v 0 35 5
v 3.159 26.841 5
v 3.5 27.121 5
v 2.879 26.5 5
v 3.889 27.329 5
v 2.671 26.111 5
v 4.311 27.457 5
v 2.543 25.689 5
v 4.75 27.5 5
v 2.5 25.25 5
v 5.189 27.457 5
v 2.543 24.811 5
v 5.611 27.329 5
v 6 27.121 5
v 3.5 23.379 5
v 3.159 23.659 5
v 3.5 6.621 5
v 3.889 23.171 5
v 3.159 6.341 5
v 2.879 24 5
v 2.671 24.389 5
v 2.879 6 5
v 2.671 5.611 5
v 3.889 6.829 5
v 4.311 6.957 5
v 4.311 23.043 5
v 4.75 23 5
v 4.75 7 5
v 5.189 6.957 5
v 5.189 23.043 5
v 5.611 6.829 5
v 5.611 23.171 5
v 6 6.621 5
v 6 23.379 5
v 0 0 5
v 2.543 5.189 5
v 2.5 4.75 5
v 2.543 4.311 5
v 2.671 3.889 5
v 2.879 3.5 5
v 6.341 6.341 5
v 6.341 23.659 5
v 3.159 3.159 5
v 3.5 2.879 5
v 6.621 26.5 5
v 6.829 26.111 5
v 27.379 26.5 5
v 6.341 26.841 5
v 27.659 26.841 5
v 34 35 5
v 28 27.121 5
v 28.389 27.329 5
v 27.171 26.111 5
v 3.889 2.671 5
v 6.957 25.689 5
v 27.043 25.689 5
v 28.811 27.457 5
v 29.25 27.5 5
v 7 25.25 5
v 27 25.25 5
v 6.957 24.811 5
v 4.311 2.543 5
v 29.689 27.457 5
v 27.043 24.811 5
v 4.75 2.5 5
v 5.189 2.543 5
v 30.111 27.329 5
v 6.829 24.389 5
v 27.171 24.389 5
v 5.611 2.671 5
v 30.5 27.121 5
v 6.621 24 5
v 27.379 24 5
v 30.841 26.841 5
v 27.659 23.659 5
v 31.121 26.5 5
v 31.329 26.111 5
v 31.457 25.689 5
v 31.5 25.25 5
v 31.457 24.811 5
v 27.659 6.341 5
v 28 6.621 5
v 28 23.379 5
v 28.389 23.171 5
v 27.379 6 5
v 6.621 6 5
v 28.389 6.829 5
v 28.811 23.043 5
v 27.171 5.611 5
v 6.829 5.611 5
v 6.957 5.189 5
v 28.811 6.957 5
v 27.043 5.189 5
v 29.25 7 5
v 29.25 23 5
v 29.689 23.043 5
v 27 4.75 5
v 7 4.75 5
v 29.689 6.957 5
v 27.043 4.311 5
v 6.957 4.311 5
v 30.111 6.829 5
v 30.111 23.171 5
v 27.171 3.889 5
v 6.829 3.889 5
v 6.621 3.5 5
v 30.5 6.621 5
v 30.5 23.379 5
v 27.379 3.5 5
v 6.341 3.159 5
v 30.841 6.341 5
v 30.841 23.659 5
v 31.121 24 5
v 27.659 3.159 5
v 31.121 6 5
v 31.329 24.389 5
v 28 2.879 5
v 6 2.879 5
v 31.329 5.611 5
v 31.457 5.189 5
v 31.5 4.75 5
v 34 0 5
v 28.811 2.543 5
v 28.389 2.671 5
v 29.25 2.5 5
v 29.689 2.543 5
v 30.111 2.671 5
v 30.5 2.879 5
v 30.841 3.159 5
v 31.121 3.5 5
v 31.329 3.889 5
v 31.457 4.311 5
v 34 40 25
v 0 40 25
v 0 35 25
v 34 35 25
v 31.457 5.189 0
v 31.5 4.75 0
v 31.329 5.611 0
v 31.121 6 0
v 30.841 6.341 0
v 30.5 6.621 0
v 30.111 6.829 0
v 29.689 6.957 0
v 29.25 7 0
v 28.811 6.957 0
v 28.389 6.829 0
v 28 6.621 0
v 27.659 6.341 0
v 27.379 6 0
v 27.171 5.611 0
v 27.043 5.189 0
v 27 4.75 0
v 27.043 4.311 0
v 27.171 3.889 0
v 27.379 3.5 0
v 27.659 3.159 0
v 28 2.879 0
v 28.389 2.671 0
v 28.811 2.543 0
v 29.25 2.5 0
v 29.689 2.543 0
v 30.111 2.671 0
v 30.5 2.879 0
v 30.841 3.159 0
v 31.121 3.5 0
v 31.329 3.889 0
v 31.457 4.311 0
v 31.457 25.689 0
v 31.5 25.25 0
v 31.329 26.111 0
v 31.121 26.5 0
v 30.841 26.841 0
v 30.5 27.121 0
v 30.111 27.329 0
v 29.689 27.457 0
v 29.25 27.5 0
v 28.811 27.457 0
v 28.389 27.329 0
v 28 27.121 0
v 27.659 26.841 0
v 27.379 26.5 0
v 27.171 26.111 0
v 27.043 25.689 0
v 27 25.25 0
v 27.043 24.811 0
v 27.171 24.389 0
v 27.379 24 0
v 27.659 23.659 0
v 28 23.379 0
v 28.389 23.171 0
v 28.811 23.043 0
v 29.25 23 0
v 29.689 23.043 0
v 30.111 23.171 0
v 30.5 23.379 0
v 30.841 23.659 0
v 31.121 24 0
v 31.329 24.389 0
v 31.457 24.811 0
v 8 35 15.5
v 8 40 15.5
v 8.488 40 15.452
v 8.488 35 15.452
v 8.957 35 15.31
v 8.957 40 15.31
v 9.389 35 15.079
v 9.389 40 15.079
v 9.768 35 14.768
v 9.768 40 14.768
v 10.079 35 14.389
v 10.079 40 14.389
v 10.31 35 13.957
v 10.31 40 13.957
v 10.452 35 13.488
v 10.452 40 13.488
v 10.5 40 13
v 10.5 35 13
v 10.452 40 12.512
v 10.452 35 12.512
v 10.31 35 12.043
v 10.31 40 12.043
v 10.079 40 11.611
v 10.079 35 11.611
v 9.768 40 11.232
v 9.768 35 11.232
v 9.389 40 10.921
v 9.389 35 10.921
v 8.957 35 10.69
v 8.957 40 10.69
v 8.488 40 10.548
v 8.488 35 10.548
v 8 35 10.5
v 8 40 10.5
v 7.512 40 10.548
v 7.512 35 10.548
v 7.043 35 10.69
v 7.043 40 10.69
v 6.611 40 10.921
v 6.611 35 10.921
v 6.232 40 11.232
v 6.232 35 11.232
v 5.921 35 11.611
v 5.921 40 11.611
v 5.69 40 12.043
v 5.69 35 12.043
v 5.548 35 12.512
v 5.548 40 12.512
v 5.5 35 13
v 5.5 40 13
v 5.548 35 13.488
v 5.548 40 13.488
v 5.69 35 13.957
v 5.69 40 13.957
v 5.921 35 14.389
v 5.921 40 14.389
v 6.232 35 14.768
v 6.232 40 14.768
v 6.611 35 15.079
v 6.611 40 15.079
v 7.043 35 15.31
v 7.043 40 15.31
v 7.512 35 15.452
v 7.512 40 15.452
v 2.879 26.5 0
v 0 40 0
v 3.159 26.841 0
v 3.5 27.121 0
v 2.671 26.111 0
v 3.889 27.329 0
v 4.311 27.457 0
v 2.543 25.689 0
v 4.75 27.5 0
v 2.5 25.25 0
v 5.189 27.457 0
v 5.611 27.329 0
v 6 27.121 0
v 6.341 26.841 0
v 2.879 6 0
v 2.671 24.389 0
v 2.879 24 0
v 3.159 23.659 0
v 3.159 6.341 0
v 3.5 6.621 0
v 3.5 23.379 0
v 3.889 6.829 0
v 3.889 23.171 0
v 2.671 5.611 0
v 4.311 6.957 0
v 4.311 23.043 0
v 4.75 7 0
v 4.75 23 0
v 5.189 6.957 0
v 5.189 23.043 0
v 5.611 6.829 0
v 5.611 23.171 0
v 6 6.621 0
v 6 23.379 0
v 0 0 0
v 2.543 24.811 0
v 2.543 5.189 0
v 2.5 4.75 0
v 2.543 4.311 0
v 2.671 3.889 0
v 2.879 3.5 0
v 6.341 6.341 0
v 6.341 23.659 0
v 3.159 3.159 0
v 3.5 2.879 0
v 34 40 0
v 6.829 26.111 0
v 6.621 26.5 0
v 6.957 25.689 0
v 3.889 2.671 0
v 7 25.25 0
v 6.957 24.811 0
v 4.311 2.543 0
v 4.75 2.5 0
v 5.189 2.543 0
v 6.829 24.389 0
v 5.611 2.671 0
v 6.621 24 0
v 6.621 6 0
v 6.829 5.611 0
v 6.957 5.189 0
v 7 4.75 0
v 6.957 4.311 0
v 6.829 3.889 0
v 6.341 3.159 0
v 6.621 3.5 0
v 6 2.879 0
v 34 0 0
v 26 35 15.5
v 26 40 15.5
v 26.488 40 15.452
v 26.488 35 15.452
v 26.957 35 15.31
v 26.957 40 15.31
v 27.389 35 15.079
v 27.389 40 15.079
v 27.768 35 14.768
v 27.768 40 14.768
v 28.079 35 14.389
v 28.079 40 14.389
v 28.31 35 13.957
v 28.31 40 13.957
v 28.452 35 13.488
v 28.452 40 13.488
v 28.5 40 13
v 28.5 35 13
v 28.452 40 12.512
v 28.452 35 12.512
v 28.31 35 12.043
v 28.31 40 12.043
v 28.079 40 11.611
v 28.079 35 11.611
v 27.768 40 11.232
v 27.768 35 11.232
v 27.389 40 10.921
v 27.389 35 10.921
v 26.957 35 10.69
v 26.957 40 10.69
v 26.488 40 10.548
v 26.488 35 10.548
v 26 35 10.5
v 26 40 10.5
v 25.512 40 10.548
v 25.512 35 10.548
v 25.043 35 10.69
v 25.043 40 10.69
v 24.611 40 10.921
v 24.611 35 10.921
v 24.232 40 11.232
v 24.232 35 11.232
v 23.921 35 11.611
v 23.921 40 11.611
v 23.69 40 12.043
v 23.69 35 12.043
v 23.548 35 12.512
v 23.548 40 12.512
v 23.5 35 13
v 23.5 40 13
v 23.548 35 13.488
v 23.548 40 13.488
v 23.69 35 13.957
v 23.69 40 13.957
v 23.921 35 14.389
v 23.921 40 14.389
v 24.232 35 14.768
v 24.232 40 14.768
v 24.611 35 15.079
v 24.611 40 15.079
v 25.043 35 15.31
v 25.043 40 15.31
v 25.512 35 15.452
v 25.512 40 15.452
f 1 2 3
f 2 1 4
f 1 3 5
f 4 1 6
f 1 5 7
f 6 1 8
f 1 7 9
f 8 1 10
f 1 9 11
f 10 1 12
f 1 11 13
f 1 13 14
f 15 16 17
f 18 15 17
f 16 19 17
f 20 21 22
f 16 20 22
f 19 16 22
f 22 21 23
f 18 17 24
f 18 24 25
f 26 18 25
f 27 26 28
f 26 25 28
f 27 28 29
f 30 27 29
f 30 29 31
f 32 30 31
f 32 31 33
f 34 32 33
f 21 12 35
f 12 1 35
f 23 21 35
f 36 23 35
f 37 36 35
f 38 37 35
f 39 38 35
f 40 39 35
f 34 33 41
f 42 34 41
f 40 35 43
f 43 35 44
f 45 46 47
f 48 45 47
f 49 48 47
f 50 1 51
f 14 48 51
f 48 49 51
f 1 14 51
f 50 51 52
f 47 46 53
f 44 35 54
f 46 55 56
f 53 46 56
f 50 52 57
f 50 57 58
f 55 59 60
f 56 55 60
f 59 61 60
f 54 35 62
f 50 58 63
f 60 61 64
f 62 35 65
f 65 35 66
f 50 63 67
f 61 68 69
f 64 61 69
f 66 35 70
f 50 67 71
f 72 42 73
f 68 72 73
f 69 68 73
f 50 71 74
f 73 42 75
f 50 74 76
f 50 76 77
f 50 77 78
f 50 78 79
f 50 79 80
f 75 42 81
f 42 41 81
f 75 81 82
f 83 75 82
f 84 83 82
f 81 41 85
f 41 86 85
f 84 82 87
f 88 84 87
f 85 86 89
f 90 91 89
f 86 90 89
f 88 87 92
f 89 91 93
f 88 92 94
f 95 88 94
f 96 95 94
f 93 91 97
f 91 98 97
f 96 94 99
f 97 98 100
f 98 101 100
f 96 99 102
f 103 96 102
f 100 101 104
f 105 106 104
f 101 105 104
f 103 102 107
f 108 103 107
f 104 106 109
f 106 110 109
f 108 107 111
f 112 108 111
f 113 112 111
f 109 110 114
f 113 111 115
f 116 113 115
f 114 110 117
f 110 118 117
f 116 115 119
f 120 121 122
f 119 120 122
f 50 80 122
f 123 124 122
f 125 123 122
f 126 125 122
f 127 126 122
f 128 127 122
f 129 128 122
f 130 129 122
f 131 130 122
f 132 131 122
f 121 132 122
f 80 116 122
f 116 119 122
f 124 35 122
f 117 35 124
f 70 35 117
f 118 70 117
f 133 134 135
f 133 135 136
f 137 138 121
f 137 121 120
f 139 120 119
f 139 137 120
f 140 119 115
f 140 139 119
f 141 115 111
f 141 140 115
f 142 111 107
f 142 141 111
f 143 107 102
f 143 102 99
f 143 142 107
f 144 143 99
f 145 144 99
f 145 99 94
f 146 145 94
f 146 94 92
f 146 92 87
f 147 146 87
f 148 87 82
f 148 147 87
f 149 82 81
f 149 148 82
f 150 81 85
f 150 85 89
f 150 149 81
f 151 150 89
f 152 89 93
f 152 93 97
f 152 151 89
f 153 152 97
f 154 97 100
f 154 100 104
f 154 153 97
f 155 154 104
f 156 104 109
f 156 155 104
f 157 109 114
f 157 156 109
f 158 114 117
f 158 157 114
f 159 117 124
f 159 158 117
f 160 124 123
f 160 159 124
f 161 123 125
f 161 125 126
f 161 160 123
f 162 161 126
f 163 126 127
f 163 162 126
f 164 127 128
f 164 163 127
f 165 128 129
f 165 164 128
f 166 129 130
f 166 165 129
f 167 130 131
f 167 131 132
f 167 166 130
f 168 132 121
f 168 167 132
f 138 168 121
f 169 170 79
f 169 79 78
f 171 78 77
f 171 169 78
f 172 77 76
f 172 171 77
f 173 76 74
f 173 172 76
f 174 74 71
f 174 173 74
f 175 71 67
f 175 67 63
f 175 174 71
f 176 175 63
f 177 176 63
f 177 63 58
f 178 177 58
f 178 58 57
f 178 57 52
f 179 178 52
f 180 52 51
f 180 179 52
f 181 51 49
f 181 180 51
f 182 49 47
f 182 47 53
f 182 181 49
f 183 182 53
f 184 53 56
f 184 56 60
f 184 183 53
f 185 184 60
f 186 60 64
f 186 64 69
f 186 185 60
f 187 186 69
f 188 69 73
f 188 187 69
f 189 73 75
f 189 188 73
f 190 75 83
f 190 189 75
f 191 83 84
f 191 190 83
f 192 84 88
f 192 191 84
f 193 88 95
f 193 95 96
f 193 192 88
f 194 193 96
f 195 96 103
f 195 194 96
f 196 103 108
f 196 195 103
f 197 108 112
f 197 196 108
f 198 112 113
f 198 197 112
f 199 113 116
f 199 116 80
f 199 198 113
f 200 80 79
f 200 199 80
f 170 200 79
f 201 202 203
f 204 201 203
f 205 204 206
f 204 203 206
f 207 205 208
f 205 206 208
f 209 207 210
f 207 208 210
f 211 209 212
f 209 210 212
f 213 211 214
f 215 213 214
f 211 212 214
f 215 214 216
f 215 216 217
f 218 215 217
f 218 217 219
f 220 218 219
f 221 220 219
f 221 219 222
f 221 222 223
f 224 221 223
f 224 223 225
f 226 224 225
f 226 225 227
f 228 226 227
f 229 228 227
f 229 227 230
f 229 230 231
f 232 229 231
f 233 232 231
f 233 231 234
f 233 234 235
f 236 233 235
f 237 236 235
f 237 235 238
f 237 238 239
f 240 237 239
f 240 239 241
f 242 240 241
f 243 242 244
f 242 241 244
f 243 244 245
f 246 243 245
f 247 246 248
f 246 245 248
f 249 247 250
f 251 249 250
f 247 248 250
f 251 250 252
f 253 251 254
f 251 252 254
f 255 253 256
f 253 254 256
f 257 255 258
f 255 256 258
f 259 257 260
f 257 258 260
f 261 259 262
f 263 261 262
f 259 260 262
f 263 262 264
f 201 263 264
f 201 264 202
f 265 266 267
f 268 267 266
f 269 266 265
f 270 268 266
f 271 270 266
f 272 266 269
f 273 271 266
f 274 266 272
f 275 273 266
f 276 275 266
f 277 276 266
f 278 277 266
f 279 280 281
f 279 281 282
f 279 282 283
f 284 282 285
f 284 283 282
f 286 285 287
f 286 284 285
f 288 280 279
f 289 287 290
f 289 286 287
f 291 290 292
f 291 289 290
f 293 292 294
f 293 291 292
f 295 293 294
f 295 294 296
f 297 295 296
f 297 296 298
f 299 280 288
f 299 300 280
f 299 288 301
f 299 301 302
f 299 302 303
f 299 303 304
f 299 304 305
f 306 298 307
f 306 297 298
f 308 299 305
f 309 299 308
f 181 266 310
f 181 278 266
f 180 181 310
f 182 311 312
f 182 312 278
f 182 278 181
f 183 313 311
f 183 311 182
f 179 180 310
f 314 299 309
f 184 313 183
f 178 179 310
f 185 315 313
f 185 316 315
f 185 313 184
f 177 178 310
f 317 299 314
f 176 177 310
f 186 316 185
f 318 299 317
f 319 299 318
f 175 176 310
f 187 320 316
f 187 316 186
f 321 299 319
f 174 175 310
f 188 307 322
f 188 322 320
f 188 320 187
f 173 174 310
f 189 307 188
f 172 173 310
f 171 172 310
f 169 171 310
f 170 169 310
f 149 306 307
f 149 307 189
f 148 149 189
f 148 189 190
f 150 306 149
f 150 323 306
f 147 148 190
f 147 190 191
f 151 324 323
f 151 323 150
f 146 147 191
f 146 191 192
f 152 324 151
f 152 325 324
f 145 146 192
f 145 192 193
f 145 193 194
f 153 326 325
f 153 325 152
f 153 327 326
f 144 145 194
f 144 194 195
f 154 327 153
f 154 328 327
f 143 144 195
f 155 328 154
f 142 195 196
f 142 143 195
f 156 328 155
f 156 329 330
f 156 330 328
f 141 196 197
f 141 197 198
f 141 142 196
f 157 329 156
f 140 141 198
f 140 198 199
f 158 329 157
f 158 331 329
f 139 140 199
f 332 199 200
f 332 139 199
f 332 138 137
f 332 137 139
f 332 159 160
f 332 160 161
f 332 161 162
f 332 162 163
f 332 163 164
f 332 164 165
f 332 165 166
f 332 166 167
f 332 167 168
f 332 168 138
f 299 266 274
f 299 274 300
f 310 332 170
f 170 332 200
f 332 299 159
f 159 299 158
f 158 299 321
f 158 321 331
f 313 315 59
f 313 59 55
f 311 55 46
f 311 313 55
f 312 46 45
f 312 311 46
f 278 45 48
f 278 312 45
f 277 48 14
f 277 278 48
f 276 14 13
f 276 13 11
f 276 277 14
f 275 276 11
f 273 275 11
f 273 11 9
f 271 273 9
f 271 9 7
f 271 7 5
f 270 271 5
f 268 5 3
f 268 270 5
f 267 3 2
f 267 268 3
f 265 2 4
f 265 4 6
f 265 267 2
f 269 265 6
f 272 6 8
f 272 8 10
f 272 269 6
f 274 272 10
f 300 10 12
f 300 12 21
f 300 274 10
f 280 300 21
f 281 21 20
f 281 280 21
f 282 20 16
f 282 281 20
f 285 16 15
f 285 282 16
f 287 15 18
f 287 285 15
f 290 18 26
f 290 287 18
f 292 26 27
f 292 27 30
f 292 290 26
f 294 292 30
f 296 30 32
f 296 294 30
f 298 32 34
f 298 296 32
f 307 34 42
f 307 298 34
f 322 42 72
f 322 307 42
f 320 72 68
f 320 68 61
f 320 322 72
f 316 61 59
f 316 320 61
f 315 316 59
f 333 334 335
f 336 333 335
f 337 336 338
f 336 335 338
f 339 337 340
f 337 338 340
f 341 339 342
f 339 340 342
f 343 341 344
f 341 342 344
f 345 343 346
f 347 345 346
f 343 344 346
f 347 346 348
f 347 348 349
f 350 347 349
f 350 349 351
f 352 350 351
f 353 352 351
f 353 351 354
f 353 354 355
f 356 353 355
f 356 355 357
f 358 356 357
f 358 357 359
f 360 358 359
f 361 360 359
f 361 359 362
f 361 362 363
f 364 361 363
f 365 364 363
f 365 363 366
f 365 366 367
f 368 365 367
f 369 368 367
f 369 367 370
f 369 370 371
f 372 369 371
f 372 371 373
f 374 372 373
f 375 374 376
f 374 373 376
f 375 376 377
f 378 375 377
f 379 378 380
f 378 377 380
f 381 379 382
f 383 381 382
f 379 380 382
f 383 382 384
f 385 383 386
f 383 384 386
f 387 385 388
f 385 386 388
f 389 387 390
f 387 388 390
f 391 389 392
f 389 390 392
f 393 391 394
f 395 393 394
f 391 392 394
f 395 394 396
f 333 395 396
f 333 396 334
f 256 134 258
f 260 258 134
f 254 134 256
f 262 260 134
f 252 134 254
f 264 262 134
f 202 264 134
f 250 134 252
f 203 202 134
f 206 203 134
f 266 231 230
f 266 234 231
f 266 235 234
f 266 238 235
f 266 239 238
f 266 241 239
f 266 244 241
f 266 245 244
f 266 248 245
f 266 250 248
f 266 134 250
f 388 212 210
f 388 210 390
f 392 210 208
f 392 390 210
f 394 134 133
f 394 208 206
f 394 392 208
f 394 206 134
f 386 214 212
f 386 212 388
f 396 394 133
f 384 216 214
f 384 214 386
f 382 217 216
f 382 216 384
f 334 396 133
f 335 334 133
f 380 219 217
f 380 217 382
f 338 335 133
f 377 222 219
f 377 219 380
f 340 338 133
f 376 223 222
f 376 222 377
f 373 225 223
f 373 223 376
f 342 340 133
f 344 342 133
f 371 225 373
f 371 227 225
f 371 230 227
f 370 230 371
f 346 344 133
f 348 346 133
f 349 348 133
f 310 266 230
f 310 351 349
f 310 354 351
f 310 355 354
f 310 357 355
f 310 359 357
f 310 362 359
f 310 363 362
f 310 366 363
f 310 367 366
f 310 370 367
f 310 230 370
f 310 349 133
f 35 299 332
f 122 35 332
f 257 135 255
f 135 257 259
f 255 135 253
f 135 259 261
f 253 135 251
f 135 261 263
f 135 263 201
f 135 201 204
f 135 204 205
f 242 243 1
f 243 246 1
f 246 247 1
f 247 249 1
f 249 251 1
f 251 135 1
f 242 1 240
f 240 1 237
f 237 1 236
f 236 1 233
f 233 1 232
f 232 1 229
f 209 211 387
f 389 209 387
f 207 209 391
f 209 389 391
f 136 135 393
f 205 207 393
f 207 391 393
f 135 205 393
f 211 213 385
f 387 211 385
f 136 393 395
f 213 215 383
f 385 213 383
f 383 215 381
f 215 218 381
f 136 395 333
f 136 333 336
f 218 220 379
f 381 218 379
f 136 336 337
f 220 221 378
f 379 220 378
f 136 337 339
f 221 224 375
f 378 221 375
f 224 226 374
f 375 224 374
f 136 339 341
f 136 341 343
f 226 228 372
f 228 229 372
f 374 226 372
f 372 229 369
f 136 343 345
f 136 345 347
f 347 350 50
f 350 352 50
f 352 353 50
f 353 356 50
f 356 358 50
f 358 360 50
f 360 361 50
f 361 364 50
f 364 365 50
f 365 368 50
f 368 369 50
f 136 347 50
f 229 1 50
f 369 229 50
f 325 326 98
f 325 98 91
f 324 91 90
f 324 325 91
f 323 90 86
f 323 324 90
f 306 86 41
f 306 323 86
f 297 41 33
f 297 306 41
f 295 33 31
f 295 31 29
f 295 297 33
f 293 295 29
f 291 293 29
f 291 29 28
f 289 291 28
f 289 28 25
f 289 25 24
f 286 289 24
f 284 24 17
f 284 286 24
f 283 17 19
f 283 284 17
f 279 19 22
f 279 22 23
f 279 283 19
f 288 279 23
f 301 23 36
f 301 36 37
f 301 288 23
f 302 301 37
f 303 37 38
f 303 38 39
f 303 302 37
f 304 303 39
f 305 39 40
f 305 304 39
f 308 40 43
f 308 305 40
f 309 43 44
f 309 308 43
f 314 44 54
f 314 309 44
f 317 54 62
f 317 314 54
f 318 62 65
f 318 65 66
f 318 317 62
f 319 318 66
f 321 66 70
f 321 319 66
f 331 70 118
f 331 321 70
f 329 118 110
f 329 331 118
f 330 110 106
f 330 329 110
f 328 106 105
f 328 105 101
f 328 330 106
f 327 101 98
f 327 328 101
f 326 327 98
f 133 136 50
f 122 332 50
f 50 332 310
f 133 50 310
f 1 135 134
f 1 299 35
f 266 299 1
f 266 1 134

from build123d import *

# Parameters (mm, degrees)
SKETCH1_W           = 34
SKETCH1_H           = 30
SKETCH1_R           = 2.25
BOSS_EXTRUDE1_DEPTH = 5
SKETCH2_W           = 34
SKETCH2_H           = 5
BOSS_EXTRUDE2_DEPTH = 10
SKETCH3_W           = 34
SKETCH3_H           = 5
BOSS_EXTRUDE3_DEPTH = 20
SKETCH4_R           = 2.5
CUT_EXTRUDE1_DEPTH  = 20


with BuildPart() as part:
    # Sketch1 → Boss-Extrude1 (new body)
    with BuildSketch(Plane.XY):
        with Locations((17, 15)):
            Rectangle(SKETCH1_W, SKETCH1_H)
        with Locations((4.75, 25.25)):
            Circle(SKETCH1_R, mode=Mode.SUBTRACT)
        with Locations((29.25, 25.25)):
            Circle(SKETCH1_R, mode=Mode.SUBTRACT)
        with Locations((29.25, 4.75)):
            Circle(SKETCH1_R, mode=Mode.SUBTRACT)
        with Locations((4.75, 4.75)):
            Circle(SKETCH1_R, mode=Mode.SUBTRACT)
    extrude(amount=BOSS_EXTRUDE1_DEPTH)

    # Sketch2 → Boss-Extrude2 (add)
    with BuildSketch(Plane(origin=(0, 30, 0), x_dir=(1, 0, 0), z_dir=(0, 1, 0))):
        with Locations((17, -2.5)):
            Rectangle(SKETCH2_W, SKETCH2_H)
    extrude(amount=BOSS_EXTRUDE2_DEPTH)

    # Sketch3 → Boss-Extrude3 (add)
    with BuildSketch(Plane.XY.offset(5)):
        with Locations((17, 37.5)):
            Rectangle(SKETCH3_W, SKETCH3_H)
    extrude(amount=BOSS_EXTRUDE3_DEPTH)

    # Sketch4 → Cut-Extrude1 (cut)
    with BuildSketch(Plane(origin=(0, 40, 0), x_dir=(1, 0, 0), z_dir=(0, 1, 0))):
        with Locations(Location((8, -13, 0), (0, 0, 270))):
            Circle(SKETCH4_R)
        with Locations(Location((26, -13, 0), (0, 0, 270))):
            Circle(SKETCH4_R)
    extrude(amount=-CUT_EXTRUDE1_DEPTH, mode=Mode.SUBTRACT)


solid = part.part
